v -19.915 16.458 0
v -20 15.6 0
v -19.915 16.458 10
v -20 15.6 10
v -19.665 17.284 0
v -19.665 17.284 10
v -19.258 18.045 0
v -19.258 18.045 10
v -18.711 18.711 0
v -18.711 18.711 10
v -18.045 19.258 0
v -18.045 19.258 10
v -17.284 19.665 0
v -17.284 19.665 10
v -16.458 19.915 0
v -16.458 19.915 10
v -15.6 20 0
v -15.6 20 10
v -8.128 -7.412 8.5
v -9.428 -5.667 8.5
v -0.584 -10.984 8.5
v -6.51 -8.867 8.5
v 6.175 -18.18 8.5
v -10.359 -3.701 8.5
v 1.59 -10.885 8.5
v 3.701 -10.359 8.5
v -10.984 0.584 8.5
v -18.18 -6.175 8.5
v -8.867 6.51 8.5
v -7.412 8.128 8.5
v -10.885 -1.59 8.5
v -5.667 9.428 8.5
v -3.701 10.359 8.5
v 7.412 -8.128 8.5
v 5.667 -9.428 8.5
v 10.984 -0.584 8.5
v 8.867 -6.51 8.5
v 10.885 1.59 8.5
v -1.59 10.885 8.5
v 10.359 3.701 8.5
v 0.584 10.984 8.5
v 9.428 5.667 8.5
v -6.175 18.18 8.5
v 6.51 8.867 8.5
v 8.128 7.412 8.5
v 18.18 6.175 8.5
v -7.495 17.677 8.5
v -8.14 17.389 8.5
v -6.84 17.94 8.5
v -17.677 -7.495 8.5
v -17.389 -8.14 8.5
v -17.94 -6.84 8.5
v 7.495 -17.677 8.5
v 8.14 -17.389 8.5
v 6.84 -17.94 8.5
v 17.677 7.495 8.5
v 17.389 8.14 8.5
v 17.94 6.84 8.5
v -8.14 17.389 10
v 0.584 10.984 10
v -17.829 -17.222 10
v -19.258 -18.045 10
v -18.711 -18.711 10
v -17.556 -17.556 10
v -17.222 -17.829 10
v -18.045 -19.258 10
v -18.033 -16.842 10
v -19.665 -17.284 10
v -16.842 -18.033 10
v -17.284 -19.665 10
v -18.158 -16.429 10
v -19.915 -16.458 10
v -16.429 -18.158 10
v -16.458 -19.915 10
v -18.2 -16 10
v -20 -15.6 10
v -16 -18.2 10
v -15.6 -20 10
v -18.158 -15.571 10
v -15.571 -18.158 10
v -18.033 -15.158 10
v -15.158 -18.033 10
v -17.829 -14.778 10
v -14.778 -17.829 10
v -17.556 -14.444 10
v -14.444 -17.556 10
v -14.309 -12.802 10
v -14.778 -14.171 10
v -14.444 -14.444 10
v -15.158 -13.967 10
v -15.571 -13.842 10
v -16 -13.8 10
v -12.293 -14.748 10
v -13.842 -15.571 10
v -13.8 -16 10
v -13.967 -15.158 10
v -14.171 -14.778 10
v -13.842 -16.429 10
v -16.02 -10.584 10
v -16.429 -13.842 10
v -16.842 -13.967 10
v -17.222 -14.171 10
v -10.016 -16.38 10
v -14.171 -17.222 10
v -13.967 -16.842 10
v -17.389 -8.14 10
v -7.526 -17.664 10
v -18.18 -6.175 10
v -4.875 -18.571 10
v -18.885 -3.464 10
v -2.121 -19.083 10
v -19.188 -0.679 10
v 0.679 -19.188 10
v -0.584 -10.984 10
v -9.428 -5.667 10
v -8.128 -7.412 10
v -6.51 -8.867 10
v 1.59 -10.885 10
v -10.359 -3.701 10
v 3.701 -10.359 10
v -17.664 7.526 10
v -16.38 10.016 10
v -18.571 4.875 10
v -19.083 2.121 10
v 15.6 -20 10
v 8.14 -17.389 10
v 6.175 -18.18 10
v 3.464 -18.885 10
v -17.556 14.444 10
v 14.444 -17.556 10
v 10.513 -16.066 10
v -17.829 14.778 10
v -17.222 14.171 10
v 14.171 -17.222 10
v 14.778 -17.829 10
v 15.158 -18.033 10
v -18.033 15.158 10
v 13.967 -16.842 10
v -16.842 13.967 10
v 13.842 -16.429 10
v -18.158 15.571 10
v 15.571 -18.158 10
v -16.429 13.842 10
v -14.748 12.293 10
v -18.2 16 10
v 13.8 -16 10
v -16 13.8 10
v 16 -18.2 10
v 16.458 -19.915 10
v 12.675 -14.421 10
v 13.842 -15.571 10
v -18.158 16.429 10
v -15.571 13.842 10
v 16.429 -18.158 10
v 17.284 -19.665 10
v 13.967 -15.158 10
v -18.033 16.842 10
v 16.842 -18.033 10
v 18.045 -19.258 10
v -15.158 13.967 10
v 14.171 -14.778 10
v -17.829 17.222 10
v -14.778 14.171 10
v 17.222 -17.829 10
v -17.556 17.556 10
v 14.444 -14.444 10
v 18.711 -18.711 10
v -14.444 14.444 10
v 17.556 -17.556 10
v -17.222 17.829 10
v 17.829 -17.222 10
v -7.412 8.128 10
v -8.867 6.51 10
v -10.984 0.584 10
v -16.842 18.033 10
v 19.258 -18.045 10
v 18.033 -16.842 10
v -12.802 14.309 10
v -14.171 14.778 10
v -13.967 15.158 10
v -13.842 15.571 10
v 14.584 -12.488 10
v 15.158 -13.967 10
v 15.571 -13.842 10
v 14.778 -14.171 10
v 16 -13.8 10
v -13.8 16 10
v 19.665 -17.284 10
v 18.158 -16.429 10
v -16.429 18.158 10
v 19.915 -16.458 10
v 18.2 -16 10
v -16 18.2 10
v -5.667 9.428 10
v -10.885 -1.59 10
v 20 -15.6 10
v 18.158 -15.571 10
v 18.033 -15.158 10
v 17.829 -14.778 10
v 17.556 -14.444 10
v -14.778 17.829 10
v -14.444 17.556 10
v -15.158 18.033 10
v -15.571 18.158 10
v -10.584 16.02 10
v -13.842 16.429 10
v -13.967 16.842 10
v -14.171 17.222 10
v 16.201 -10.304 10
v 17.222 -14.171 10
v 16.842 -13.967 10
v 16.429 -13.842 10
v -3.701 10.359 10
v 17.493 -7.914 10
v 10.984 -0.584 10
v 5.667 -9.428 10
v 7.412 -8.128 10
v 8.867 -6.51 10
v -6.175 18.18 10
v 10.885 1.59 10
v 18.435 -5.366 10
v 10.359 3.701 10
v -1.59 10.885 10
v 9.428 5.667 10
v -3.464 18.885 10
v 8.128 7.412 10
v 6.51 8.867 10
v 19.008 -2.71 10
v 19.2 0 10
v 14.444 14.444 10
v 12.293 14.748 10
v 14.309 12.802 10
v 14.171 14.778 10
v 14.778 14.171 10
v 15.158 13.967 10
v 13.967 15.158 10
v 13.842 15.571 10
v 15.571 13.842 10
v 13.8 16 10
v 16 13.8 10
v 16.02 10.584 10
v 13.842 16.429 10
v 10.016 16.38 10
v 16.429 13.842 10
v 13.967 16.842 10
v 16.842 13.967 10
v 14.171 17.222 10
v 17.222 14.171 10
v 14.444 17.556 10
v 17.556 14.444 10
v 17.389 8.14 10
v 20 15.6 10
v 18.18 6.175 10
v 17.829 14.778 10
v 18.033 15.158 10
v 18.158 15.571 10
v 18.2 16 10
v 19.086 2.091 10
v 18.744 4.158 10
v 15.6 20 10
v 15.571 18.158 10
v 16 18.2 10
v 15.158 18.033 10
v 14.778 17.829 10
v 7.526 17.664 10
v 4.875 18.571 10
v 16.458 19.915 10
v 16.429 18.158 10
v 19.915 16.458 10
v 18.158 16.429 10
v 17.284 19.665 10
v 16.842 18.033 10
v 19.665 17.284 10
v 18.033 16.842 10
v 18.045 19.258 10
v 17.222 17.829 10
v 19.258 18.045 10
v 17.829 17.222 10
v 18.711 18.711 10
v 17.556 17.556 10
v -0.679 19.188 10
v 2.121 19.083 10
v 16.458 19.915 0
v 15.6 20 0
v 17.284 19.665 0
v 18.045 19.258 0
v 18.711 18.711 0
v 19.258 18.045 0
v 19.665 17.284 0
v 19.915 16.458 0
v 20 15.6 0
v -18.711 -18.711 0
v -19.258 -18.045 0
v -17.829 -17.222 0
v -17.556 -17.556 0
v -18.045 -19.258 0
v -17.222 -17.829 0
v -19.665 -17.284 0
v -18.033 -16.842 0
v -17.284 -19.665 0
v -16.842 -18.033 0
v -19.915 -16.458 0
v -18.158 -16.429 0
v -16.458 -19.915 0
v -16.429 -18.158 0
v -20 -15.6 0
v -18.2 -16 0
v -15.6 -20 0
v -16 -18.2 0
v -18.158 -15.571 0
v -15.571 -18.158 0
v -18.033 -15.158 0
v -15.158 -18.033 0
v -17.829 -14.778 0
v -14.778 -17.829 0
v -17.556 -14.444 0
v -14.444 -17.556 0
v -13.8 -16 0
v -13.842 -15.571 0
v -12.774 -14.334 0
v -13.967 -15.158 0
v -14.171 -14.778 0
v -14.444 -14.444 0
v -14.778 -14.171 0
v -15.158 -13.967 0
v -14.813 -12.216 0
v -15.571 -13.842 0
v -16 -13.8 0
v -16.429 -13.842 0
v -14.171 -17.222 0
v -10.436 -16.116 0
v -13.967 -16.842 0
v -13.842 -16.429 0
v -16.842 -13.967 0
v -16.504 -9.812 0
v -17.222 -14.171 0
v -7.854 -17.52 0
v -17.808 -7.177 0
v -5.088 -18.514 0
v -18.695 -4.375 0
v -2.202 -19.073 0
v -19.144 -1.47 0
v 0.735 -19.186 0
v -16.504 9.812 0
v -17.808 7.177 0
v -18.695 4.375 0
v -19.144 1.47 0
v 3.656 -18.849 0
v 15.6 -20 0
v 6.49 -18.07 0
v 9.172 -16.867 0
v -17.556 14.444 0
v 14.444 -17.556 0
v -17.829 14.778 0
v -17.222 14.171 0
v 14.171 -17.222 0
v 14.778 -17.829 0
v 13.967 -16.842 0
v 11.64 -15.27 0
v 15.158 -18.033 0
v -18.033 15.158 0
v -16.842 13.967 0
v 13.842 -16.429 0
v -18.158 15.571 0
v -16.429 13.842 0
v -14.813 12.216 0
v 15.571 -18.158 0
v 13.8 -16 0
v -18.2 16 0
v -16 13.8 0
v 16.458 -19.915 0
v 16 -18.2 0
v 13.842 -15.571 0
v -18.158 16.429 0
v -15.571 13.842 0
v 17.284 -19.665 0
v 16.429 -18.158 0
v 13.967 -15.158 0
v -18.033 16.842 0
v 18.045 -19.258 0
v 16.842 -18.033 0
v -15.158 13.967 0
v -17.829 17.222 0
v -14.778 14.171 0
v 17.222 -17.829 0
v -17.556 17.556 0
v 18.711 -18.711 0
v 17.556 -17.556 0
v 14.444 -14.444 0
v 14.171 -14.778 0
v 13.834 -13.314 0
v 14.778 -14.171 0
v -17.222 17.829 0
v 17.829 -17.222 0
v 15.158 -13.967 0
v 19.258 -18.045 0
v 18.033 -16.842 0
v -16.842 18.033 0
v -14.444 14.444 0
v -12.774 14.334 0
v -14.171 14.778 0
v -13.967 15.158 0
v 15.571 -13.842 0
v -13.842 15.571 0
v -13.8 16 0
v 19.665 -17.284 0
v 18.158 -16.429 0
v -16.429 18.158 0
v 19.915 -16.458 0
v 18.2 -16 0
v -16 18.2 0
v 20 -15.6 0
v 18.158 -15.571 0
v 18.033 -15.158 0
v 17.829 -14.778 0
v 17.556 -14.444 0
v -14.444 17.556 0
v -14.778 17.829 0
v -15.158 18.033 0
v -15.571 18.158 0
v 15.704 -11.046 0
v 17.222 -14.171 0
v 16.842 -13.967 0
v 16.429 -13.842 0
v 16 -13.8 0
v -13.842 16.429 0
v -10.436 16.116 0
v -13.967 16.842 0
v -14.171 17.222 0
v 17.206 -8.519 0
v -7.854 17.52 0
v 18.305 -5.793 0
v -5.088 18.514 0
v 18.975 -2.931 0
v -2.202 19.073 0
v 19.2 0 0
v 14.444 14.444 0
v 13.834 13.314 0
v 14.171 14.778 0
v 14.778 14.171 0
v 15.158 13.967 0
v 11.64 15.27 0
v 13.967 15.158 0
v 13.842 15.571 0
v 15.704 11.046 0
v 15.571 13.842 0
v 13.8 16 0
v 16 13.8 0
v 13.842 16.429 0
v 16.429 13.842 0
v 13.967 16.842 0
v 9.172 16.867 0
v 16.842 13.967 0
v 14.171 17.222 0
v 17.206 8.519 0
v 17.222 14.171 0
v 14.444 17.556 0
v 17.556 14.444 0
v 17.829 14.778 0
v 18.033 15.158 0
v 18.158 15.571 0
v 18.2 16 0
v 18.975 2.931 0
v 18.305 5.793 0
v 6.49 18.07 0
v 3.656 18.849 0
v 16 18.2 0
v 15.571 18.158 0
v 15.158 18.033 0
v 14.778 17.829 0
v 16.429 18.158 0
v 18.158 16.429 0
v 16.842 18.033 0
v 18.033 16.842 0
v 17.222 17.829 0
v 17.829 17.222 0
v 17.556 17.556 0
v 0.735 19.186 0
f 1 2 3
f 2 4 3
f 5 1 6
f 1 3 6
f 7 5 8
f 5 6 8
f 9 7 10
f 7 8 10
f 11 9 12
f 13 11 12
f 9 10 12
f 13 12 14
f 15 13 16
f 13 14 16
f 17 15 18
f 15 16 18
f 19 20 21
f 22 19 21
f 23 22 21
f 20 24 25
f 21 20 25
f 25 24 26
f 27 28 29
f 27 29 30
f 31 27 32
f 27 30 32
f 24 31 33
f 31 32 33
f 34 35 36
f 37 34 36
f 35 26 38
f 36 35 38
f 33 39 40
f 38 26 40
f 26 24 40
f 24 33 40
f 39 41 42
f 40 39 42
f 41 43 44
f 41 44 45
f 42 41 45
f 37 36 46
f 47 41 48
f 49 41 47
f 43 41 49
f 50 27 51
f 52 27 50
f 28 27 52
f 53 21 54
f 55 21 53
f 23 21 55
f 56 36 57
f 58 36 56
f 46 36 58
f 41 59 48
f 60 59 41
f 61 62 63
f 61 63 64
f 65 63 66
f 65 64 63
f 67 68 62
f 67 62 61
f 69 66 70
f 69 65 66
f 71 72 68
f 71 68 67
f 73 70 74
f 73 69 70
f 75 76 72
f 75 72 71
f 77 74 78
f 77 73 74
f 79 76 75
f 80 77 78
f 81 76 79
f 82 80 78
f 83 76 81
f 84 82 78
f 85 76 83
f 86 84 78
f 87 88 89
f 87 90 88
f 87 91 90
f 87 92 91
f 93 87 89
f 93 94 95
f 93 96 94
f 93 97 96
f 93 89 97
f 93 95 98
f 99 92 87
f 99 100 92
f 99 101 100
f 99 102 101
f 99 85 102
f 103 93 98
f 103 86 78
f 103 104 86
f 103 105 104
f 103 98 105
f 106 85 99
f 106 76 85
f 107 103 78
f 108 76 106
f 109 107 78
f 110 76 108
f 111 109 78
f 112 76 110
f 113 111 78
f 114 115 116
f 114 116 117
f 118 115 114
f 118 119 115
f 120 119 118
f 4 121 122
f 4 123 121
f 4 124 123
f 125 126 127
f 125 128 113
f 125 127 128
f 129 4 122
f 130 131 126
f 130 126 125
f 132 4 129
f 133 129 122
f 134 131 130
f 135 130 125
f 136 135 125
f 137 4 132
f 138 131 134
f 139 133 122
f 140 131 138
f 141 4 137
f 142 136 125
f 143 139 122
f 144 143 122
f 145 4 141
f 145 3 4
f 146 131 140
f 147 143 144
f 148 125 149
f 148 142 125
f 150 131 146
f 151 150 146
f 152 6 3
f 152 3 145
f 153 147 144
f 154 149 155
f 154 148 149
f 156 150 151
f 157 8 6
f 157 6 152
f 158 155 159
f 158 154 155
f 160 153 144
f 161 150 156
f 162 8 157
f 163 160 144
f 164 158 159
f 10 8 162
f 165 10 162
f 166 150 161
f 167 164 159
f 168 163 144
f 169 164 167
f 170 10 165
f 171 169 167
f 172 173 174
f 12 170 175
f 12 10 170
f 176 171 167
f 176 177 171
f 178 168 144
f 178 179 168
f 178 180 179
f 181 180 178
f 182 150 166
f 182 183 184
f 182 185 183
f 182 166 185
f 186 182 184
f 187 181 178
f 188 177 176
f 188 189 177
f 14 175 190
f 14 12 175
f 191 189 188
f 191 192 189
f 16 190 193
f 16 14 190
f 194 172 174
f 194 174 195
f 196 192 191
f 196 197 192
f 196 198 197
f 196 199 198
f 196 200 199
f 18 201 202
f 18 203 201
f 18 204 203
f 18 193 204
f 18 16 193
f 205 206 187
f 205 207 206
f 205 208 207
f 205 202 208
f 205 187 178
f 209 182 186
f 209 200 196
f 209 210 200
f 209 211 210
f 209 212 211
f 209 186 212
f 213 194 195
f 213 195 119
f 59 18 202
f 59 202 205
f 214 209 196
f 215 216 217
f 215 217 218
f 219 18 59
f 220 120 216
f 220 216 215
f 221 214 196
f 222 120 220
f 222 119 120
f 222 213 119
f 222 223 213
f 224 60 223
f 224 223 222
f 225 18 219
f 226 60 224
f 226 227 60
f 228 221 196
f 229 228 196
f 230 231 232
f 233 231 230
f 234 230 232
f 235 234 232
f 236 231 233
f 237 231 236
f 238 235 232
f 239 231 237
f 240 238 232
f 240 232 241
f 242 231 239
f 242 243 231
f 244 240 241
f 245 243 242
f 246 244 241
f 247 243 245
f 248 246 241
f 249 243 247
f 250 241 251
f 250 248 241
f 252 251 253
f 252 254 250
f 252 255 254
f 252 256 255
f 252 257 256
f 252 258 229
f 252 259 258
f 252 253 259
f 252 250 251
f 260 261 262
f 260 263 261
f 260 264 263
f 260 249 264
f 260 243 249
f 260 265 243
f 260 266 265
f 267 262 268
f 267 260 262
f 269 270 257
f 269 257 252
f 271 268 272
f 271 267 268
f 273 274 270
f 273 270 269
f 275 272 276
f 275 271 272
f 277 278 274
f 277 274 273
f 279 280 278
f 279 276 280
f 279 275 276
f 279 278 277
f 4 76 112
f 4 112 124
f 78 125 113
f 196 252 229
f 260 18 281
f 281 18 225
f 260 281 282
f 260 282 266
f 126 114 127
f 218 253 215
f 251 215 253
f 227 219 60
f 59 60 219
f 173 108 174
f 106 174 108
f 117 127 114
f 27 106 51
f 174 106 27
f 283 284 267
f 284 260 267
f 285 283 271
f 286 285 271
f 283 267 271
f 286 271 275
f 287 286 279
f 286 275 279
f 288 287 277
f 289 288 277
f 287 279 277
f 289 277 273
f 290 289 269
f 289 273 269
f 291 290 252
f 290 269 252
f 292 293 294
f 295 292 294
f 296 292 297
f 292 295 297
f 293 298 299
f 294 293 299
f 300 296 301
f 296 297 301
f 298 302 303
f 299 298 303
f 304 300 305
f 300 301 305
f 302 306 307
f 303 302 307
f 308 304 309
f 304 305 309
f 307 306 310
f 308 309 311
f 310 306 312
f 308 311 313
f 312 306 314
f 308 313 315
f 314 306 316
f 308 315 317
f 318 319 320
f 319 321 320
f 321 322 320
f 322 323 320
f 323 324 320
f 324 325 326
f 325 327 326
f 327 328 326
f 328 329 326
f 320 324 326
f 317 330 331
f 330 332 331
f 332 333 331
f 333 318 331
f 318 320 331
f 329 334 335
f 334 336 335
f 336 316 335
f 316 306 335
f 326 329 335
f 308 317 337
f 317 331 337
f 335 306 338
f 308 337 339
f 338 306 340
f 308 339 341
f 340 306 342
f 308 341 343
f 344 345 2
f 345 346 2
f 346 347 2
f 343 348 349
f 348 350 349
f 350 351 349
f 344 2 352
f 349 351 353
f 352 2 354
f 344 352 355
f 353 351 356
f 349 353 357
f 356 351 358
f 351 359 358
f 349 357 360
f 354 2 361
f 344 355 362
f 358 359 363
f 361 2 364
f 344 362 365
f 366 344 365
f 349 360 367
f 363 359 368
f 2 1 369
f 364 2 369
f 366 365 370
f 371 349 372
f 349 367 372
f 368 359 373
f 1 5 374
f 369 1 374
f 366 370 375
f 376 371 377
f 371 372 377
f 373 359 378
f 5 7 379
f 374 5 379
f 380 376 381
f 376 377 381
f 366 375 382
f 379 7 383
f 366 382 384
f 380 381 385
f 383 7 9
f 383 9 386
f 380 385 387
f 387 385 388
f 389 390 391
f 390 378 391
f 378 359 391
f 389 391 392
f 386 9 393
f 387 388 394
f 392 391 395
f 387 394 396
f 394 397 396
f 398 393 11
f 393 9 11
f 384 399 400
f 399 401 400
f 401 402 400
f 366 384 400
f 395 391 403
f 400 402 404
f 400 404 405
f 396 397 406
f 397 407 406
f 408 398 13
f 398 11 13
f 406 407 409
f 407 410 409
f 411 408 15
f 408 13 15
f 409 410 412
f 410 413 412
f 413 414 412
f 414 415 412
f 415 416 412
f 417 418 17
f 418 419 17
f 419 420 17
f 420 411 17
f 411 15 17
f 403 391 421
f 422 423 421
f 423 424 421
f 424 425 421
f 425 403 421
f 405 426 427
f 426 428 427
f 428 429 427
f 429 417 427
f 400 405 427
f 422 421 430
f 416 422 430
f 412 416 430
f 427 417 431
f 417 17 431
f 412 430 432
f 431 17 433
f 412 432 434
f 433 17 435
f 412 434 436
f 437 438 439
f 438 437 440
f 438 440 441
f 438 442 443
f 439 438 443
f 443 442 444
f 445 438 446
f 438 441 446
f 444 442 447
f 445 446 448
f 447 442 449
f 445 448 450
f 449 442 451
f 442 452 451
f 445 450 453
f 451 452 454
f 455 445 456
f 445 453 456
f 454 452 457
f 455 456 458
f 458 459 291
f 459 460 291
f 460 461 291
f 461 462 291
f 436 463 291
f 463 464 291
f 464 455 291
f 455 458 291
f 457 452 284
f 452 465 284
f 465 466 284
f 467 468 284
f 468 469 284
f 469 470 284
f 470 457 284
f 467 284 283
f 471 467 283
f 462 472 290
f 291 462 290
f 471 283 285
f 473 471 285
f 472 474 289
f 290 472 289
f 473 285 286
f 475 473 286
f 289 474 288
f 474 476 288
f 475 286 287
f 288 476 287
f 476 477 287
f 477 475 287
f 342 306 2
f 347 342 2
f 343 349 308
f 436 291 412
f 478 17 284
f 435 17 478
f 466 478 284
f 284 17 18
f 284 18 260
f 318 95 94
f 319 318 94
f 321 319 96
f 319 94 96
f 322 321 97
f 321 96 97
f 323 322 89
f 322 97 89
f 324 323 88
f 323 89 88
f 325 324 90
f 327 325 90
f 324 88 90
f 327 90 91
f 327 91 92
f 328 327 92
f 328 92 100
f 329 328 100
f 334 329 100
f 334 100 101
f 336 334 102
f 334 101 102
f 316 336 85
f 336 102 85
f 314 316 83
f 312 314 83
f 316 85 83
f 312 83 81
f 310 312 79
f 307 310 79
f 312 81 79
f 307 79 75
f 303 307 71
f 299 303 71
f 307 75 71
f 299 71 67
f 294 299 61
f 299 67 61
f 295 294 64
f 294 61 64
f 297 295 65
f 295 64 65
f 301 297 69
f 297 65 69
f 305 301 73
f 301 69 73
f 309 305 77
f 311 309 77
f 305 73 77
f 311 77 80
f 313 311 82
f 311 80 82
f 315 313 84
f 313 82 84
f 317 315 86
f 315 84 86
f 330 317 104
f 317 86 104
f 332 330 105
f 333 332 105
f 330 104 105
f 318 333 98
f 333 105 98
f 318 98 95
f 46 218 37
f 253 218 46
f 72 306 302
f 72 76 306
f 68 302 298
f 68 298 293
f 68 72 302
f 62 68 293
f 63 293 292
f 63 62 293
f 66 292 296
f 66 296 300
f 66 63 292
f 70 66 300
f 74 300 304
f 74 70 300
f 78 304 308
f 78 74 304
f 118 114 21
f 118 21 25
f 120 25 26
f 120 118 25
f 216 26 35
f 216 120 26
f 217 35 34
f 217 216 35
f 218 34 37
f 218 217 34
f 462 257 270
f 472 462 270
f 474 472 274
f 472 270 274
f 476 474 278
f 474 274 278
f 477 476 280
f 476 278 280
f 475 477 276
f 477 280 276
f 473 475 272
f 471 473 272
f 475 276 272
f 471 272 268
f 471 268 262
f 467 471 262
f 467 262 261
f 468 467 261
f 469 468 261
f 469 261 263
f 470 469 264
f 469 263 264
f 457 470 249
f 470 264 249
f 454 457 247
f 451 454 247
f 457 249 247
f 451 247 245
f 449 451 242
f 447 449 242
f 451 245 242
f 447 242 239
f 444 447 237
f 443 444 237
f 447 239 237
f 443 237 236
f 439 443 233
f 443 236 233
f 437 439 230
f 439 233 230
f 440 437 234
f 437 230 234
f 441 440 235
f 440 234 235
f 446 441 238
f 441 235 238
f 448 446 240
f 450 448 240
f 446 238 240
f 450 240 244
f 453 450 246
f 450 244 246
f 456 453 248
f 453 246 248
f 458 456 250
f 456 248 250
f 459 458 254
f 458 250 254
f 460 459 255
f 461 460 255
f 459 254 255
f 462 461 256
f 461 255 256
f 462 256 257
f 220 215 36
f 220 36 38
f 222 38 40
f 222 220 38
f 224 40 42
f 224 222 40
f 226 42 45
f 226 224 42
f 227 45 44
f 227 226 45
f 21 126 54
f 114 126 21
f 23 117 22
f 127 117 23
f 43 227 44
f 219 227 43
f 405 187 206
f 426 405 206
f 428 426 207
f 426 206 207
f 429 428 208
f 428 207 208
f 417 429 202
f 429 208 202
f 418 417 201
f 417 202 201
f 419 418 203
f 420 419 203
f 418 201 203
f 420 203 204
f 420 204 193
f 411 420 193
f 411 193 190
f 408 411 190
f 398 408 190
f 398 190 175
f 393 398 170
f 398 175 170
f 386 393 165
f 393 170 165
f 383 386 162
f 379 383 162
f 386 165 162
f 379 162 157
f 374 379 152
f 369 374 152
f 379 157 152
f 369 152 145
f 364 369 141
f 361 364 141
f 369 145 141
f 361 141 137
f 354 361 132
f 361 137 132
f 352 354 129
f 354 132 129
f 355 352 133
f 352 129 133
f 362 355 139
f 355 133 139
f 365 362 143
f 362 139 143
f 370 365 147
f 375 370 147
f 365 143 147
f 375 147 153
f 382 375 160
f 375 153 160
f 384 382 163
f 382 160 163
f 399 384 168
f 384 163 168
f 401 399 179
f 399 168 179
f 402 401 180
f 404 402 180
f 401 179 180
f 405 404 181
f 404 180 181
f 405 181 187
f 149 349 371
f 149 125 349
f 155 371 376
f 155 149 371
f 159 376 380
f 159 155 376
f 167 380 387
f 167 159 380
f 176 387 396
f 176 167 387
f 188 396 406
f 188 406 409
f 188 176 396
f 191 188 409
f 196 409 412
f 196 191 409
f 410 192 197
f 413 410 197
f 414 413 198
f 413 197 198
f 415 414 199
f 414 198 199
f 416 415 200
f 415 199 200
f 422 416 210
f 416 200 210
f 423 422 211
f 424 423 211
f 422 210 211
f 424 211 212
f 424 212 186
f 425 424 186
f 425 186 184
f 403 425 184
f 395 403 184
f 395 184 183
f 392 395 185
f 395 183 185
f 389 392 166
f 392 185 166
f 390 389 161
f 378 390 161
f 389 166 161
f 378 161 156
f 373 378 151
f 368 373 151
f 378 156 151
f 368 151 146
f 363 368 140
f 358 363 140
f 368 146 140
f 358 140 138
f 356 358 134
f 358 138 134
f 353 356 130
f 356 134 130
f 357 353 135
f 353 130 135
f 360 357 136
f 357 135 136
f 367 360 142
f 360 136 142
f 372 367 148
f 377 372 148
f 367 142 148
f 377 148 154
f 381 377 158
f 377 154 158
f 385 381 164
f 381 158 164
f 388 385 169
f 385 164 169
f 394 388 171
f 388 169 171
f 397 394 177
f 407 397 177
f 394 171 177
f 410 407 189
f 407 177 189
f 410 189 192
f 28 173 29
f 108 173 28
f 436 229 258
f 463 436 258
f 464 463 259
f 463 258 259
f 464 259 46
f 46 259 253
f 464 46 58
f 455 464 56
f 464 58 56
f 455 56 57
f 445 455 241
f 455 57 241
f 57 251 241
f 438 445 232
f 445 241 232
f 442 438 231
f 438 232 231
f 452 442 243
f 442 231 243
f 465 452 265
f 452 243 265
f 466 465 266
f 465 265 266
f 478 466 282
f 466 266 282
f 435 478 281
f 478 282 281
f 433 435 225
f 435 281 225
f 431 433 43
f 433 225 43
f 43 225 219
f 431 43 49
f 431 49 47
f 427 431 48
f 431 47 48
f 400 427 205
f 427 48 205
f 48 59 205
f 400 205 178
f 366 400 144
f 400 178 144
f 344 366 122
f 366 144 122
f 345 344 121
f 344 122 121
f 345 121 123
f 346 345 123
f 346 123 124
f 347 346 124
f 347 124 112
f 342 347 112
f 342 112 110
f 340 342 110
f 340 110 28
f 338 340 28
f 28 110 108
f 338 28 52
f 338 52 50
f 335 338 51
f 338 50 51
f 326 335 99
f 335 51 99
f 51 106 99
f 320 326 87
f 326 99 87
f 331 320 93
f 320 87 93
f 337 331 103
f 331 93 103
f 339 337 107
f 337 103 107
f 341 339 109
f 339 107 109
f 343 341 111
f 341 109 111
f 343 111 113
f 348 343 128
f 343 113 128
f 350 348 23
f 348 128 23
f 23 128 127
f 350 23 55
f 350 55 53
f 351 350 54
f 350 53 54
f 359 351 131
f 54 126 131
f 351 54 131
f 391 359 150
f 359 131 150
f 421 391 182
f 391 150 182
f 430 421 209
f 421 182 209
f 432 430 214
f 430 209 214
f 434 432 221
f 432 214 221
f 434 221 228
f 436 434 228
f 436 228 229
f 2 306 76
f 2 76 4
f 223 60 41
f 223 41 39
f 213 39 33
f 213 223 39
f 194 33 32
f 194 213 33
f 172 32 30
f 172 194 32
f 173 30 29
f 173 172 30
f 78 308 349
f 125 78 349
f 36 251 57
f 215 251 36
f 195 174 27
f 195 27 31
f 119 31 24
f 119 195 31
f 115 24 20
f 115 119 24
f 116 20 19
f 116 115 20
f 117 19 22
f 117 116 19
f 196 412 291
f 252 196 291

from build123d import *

# Parameters (mm, degrees)
SKETCH1_W           = 40
SKETCH1_H           = 40
BOSS_EXTRUDE1_DEPTH = 10
SKETCH2_R           = 2.2
CUT_EXTRUDE1_DEPTH  = 10
SKETCH3_R           = 19.2
CUT_EXTRUDE2_DEPTH  = 10
FILLET1_R           = 4.4
BOSS_EXTRUDE2_DEPTH = 1.5


with BuildPart() as part:
    # Sketch1 → Boss-Extrude1 (new body)
    with BuildSketch(Plane.XY):
        Rectangle(SKETCH1_W, SKETCH1_H)
    extrude(amount=BOSS_EXTRUDE1_DEPTH)

    # Sketch2 → Cut-Extrude1 (cut)
    with BuildSketch(Plane.XY.offset(10)):
        with Locations((-16, 16)):
            Circle(SKETCH2_R)
        with Locations((16, 16)):
            Circle(SKETCH2_R)
        with Locations((16, -16)):
            Circle(SKETCH2_R)
        with Locations((-16, -16)):
            Circle(SKETCH2_R)
    extrude(amount=-CUT_EXTRUDE1_DEPTH, mode=Mode.SUBTRACT)

    # Sketch3 → Cut-Extrude2 (cut)
    with BuildSketch(Plane.XY.offset(10)):
        Circle(SKETCH3_R)
    extrude(amount=-CUT_EXTRUDE2_DEPTH, mode=Mode.SUBTRACT)

    # Fillet1
    fillet1_edges = [part.edges().sort_by_distance(p)[0] for p in [
        (-20, 20, 5),
        (20, 20, 5),
        (20, -20, 5),
        (-20, -20, 5),
    ]]
    fillet(fillet1_edges, radius=FILLET1_R)

    # Sketch4 → Boss-Extrude2 (add)
    with BuildSketch(Plane.XY.offset(10)):
        with BuildLine():
            Line((6.50980229, 8.866931496), (-6.175215064, 18.179843754))
            ThreePointArc((-6.175215064, 18.179843754), (-7.1684264, 17.811615956), (-8.139818596, 17.389173449))
            Line((-8.139818596, 17.389173449), (0.583931442, 10.98449016))
            ThreePointArc((0.583931442, 10.98449016), (-4.707199842, 9.941944963), (-8.866931496, 6.50980229))
            Line((-8.866931496, 6.50980229), (-18.179843754, -6.175215064))
            ThreePointArc((-18.179843754, -6.175215064), (-17.811615956, -7.1684264), (-17.389173449, -8.139818596))
            Line((-17.389173449, -8.139818596), (-10.98449016, 0.583931442))
            ThreePointArc((-10.98449016, 0.583931442), (-9.941944963, -4.707199842), (-6.50980229, -8.866931496))
            Line((-6.50980229, -8.866931496), (6.175215064, -18.179843754))
            ThreePointArc((6.175215064, -18.179843754), (7.1684264, -17.811615956), (8.139818596, -17.389173449))
            Line((8.139818596, -17.389173449), (-0.583931442, -10.98449016))
            ThreePointArc((-0.583931442, -10.98449016), (4.707199842, -9.941944963), (8.866931496, -6.50980229))
            Line((8.866931496, -6.50980229), (18.179843754, 6.175215064))
            ThreePointArc((18.179843754, 6.175215064), (17.811615956, 7.1684264), (17.389173449, 8.139818596))
            Line((17.389173449, 8.139818596), (10.98449016, -0.583931442))
            ThreePointArc((10.98449016, -0.583931442), (9.941944963, 4.707199842), (6.50980229, 8.866931496))
        make_face()
    extrude(amount=-BOSS_EXTRUDE2_DEPTH)


solid = part.part
